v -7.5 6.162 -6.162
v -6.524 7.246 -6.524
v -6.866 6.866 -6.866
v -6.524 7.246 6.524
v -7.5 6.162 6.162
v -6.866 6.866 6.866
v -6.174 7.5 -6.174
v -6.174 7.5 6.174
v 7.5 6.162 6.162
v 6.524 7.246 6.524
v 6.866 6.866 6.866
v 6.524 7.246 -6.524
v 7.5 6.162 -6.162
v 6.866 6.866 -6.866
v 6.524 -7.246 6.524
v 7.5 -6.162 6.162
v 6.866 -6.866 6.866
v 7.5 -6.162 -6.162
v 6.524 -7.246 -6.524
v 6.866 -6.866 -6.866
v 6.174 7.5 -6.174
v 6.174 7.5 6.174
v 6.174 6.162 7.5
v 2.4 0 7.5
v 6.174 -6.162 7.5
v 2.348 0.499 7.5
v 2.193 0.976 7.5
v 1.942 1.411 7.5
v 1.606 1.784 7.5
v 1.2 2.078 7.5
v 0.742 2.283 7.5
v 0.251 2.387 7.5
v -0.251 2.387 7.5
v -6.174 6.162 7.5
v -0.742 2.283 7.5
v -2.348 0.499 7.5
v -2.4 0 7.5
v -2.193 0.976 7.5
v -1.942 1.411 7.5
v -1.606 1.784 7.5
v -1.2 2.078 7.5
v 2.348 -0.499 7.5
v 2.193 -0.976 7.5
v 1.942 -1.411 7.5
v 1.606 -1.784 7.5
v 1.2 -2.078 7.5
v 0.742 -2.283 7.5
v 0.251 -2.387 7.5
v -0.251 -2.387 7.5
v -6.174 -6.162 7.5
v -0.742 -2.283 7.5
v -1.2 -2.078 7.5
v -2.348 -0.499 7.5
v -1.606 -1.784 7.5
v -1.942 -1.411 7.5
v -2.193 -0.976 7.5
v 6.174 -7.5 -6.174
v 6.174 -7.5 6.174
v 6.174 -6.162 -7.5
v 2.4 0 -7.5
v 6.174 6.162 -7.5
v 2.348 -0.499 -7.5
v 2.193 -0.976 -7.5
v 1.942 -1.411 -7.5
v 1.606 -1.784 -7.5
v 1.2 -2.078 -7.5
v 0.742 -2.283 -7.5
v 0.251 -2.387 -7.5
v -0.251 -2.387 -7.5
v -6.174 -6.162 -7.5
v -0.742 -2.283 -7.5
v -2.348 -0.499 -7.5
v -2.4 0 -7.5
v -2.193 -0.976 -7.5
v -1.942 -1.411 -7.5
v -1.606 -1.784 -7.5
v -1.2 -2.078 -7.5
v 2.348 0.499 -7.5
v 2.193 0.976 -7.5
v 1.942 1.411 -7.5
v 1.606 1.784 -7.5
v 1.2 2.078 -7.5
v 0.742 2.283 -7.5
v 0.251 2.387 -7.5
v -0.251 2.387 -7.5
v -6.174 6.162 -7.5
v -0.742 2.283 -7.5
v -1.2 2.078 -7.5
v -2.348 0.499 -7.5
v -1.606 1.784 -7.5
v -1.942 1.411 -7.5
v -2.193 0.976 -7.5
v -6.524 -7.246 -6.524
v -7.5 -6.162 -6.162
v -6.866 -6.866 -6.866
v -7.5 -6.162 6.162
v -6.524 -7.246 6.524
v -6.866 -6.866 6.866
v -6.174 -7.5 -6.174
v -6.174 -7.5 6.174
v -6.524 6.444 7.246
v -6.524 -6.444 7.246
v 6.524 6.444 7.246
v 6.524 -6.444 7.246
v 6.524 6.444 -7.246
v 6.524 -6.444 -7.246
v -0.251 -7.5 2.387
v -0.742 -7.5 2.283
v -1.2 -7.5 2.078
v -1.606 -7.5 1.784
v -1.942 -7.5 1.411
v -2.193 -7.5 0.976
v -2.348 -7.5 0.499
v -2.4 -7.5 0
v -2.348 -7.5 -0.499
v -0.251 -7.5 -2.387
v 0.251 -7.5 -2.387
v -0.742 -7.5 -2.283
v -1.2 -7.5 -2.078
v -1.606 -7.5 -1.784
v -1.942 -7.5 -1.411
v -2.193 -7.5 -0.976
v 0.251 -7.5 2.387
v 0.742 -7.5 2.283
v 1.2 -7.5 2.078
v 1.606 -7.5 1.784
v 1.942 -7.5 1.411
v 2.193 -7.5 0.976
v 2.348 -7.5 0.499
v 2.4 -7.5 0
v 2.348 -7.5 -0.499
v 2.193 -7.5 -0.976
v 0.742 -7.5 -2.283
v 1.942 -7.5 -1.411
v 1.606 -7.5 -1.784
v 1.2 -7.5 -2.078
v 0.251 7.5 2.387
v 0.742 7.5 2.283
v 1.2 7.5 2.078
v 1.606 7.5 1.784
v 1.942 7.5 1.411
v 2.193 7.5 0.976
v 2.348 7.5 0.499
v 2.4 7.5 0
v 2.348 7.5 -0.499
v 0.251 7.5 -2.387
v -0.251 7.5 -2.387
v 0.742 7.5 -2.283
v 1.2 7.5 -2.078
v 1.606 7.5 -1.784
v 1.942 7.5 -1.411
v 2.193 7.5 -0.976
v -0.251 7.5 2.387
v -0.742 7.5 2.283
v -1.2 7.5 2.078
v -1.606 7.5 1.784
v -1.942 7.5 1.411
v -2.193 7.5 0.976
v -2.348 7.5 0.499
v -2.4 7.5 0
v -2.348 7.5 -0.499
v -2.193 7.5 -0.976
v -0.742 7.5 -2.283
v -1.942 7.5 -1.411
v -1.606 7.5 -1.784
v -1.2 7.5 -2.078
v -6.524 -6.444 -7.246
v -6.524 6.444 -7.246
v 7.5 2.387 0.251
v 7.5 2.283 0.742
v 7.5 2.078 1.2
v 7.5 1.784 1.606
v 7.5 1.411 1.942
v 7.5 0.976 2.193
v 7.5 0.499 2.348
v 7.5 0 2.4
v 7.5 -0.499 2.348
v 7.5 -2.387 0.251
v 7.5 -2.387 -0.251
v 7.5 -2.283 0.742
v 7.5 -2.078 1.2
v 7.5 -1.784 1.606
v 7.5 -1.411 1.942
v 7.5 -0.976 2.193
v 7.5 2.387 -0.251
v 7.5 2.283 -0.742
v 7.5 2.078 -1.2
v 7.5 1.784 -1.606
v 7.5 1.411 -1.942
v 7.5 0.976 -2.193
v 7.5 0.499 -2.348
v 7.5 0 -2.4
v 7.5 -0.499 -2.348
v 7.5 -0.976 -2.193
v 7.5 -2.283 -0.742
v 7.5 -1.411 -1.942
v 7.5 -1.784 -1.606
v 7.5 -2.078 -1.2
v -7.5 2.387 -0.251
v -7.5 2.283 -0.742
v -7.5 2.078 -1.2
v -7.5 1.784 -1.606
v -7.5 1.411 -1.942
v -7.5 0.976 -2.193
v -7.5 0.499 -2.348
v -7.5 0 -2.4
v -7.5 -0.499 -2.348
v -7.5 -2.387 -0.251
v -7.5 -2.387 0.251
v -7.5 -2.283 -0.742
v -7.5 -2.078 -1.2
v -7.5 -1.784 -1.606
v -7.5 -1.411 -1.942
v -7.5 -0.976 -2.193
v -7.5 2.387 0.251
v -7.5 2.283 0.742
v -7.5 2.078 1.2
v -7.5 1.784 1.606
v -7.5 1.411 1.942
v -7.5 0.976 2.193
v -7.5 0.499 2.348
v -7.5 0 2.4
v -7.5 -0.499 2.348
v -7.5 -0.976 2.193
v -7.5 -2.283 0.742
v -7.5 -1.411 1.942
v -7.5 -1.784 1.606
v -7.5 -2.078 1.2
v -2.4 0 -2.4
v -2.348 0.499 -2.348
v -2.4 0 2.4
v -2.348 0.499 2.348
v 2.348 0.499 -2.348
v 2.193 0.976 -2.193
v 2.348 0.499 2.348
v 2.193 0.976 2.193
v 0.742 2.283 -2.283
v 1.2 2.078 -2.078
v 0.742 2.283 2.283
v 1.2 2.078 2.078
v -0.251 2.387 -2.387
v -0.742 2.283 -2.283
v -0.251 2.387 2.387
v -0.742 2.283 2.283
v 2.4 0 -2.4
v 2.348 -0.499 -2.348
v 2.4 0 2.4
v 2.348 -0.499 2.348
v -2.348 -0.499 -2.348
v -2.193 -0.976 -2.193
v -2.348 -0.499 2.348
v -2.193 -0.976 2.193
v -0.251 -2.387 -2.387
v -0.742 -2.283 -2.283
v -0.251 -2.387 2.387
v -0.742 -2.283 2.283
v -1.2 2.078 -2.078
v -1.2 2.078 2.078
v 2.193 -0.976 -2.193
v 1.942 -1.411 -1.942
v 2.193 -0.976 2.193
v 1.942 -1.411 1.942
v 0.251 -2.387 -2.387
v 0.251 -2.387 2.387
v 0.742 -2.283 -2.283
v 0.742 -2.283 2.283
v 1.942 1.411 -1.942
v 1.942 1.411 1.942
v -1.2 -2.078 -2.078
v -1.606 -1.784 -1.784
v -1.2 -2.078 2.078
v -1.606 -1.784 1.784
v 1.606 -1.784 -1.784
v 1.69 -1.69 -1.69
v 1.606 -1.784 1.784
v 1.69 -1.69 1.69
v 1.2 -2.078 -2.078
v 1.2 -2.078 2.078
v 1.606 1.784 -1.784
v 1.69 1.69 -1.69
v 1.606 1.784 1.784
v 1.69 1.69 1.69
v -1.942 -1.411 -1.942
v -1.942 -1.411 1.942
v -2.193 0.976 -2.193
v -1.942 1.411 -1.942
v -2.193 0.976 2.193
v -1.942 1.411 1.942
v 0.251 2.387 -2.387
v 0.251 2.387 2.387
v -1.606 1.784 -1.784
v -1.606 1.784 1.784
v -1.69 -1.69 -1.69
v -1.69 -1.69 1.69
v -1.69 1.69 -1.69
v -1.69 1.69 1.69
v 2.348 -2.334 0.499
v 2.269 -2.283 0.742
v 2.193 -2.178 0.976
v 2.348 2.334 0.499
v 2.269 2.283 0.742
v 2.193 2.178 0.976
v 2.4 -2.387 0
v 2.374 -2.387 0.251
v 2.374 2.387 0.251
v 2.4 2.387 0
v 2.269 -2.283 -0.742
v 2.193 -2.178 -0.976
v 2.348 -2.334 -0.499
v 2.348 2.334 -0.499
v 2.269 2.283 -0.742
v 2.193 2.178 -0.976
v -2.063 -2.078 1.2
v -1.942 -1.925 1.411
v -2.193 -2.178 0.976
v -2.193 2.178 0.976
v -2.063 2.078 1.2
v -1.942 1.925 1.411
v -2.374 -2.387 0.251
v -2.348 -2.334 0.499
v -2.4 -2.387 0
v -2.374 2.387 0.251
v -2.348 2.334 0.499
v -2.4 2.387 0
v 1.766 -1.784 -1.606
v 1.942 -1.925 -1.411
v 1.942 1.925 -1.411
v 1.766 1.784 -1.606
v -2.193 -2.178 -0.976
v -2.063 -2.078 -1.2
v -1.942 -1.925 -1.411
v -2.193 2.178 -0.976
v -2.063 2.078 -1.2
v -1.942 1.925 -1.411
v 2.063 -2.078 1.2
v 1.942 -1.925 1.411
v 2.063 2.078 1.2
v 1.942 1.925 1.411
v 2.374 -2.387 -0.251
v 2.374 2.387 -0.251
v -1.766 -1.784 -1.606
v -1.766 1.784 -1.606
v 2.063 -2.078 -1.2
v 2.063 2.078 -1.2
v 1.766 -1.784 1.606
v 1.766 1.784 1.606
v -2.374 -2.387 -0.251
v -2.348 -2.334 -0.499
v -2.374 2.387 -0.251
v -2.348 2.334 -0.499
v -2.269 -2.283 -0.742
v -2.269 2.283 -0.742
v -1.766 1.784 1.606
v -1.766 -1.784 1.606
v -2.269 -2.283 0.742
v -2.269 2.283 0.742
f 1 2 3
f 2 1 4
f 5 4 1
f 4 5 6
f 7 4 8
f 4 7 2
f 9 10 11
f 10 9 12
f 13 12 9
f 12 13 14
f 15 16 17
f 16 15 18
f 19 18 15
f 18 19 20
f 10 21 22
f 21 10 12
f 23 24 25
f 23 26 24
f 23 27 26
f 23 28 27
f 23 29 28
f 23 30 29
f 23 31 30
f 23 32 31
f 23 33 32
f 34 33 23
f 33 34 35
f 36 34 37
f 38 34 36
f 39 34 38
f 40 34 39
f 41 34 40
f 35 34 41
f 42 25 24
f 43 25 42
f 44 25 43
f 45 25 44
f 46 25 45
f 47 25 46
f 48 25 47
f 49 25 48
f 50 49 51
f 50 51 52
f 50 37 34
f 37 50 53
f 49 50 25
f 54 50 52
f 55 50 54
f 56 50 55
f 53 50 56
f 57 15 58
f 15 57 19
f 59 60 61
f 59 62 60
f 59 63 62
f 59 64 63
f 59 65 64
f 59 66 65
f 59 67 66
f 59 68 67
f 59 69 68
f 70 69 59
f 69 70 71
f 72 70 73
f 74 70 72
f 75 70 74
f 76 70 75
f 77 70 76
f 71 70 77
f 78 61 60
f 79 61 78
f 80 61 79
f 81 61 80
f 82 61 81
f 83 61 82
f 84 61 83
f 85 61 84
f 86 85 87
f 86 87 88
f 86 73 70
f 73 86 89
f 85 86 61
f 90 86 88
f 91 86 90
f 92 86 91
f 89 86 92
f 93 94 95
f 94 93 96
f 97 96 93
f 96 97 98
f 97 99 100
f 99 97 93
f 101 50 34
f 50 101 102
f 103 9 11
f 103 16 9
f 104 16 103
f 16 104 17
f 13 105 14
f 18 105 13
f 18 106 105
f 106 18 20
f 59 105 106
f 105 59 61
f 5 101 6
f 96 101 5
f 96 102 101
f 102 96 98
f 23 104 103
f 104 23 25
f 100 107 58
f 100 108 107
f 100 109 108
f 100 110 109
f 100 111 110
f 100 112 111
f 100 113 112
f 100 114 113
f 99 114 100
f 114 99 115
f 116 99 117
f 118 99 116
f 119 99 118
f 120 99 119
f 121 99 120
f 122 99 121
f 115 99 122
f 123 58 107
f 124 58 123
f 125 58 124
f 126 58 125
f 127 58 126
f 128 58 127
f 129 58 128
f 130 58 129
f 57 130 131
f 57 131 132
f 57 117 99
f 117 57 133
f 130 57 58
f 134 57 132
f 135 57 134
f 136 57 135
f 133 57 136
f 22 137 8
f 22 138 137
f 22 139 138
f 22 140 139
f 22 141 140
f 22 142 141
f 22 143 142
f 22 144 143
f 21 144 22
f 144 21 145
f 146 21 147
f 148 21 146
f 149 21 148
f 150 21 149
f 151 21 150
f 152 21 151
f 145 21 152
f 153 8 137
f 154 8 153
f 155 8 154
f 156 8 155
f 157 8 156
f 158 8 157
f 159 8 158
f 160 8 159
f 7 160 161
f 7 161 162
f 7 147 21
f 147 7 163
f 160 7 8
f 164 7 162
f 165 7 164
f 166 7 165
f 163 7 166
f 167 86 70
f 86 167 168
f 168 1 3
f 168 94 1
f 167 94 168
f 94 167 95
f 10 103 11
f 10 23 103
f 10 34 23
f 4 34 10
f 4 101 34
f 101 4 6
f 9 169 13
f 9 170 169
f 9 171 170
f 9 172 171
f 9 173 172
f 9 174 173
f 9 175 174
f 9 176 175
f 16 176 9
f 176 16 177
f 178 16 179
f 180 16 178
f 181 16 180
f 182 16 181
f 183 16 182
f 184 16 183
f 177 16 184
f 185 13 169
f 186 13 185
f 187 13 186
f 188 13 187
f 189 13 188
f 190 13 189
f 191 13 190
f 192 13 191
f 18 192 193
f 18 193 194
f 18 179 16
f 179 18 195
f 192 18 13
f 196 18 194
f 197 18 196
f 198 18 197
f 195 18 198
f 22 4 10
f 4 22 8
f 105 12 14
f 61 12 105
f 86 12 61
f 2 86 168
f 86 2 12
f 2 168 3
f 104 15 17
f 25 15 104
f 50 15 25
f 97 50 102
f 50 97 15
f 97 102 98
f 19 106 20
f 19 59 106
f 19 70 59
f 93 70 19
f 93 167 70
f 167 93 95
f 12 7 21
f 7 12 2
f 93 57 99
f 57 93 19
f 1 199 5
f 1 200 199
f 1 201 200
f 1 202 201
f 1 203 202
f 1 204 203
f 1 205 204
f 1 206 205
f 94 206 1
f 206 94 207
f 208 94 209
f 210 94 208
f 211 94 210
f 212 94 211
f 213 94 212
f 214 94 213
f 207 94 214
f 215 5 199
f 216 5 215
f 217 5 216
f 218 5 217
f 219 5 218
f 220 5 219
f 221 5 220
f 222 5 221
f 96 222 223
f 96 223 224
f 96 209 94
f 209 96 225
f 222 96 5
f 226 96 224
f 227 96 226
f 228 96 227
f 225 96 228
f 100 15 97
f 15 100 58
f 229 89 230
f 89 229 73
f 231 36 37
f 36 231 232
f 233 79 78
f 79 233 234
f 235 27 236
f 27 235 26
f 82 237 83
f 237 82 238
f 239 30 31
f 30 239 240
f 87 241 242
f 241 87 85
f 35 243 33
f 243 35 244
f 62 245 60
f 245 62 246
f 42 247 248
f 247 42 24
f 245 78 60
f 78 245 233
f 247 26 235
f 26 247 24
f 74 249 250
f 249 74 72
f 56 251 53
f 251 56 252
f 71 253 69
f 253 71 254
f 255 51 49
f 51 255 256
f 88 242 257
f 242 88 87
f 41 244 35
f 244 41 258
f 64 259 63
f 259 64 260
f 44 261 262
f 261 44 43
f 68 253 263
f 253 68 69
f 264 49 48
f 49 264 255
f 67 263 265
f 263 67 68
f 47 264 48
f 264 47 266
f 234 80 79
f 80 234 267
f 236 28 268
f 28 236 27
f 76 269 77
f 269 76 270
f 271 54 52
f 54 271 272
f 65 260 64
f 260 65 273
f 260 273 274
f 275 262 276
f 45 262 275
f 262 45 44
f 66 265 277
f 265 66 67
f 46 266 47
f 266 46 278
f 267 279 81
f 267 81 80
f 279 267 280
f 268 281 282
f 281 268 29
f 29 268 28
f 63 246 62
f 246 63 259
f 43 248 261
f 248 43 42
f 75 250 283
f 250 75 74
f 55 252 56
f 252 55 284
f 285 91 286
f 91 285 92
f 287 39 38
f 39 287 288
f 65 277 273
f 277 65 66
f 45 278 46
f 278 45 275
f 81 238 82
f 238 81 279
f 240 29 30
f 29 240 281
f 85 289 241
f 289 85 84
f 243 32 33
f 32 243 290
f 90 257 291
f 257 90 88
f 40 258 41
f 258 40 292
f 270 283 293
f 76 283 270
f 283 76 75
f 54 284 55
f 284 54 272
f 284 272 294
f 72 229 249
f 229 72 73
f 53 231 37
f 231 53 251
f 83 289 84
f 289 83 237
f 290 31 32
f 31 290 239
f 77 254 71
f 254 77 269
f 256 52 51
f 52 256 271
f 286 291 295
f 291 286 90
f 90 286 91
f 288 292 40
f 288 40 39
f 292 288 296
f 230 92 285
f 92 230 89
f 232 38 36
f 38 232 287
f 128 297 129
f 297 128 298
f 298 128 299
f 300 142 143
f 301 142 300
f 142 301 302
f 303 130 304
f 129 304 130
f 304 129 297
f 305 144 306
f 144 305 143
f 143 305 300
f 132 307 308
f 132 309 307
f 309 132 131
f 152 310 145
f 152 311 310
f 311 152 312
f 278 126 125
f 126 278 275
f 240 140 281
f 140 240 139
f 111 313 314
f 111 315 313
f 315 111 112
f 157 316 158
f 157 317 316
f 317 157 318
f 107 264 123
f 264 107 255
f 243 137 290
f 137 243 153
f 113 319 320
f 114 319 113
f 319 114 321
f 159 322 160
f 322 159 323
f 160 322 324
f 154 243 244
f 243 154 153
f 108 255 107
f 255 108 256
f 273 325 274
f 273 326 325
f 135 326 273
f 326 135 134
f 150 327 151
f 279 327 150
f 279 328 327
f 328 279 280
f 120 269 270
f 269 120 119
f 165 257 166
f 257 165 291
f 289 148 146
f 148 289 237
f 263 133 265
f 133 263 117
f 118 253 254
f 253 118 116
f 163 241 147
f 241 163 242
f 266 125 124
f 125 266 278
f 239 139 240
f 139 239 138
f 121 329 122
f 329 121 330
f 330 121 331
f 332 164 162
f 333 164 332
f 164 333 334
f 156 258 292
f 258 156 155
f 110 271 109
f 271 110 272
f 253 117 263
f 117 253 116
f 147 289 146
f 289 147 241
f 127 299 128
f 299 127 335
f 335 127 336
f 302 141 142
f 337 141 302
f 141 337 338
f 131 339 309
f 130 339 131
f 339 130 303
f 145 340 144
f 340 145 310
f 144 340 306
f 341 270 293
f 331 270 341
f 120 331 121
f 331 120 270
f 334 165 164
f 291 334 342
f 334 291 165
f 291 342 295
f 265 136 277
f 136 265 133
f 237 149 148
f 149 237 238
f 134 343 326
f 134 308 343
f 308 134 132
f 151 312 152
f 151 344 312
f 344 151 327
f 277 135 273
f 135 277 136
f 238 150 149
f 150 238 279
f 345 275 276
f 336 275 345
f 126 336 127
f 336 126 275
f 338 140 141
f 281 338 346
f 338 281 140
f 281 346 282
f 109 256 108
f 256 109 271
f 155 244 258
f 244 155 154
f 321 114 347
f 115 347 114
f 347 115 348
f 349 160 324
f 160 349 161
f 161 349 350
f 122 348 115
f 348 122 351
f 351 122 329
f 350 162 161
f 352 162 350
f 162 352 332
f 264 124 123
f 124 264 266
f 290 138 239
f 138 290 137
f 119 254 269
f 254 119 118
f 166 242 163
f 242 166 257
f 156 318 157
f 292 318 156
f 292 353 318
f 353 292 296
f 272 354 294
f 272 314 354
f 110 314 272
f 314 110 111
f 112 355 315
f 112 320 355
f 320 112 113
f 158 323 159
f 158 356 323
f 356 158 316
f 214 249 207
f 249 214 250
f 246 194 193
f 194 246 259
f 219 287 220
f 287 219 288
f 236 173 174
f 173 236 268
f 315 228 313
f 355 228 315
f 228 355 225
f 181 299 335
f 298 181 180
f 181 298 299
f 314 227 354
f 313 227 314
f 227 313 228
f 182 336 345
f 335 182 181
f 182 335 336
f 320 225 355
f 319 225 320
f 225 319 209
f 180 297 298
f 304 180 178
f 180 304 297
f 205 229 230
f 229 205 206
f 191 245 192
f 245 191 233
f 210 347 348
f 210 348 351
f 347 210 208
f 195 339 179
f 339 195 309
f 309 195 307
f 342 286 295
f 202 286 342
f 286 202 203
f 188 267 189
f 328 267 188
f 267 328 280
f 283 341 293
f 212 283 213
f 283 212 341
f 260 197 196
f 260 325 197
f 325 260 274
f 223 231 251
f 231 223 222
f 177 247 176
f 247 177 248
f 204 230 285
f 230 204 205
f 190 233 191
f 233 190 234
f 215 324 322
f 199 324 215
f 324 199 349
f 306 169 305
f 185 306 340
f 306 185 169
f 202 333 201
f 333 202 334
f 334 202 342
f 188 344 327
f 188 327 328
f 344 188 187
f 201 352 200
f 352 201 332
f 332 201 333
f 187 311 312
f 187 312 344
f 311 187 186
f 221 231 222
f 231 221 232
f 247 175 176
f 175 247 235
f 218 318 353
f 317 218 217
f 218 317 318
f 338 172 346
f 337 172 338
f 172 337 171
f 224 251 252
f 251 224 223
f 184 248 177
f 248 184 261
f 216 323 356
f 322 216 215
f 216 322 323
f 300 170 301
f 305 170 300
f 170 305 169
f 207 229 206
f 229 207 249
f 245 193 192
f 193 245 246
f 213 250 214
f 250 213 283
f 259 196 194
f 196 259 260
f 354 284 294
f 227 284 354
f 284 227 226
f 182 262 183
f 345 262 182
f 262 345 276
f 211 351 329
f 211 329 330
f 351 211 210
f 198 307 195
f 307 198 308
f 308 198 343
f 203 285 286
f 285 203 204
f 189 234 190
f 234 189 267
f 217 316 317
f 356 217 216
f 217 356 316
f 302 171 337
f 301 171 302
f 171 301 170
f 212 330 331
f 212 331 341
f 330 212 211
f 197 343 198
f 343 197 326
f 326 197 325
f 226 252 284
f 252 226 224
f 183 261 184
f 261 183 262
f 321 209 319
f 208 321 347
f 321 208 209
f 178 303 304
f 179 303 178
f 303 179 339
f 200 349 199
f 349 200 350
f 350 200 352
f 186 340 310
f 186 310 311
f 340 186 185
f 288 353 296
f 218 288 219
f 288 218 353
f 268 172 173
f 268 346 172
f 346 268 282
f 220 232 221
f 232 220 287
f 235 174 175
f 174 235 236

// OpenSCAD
$fn =30;
base =15; // needs to be 3 larger, used to be 5
module peghole(){
    color("Blue")cylinder (18, 2.4, 2.4, true);
}
// the peg hole template, a change in size here changes hole everywhere
//peg hole enlarged, used to be 6, .8, .8)

module peg(){
    cylinder (6, 2.4, 2.4);
}

module edge(){
cylinder (base, 9.75, 9.75, true);
}
// a cylinder for making block
//enlarged, used to be base, 3.25,3.25


module block(){
    intersection(){
edge();
rotate([90,0,0]) edge();
rotate([0, 90, 0]) edge();
}
}
// create the base cube without the holes
//block();

module blox(){
difference(){ 
block();
   peghole();
rotate ([90, 0, 0]) peghole();
rotate ([0, 90, 0]) peghole();
}
}
blox();
//unembeleshed blox cube
